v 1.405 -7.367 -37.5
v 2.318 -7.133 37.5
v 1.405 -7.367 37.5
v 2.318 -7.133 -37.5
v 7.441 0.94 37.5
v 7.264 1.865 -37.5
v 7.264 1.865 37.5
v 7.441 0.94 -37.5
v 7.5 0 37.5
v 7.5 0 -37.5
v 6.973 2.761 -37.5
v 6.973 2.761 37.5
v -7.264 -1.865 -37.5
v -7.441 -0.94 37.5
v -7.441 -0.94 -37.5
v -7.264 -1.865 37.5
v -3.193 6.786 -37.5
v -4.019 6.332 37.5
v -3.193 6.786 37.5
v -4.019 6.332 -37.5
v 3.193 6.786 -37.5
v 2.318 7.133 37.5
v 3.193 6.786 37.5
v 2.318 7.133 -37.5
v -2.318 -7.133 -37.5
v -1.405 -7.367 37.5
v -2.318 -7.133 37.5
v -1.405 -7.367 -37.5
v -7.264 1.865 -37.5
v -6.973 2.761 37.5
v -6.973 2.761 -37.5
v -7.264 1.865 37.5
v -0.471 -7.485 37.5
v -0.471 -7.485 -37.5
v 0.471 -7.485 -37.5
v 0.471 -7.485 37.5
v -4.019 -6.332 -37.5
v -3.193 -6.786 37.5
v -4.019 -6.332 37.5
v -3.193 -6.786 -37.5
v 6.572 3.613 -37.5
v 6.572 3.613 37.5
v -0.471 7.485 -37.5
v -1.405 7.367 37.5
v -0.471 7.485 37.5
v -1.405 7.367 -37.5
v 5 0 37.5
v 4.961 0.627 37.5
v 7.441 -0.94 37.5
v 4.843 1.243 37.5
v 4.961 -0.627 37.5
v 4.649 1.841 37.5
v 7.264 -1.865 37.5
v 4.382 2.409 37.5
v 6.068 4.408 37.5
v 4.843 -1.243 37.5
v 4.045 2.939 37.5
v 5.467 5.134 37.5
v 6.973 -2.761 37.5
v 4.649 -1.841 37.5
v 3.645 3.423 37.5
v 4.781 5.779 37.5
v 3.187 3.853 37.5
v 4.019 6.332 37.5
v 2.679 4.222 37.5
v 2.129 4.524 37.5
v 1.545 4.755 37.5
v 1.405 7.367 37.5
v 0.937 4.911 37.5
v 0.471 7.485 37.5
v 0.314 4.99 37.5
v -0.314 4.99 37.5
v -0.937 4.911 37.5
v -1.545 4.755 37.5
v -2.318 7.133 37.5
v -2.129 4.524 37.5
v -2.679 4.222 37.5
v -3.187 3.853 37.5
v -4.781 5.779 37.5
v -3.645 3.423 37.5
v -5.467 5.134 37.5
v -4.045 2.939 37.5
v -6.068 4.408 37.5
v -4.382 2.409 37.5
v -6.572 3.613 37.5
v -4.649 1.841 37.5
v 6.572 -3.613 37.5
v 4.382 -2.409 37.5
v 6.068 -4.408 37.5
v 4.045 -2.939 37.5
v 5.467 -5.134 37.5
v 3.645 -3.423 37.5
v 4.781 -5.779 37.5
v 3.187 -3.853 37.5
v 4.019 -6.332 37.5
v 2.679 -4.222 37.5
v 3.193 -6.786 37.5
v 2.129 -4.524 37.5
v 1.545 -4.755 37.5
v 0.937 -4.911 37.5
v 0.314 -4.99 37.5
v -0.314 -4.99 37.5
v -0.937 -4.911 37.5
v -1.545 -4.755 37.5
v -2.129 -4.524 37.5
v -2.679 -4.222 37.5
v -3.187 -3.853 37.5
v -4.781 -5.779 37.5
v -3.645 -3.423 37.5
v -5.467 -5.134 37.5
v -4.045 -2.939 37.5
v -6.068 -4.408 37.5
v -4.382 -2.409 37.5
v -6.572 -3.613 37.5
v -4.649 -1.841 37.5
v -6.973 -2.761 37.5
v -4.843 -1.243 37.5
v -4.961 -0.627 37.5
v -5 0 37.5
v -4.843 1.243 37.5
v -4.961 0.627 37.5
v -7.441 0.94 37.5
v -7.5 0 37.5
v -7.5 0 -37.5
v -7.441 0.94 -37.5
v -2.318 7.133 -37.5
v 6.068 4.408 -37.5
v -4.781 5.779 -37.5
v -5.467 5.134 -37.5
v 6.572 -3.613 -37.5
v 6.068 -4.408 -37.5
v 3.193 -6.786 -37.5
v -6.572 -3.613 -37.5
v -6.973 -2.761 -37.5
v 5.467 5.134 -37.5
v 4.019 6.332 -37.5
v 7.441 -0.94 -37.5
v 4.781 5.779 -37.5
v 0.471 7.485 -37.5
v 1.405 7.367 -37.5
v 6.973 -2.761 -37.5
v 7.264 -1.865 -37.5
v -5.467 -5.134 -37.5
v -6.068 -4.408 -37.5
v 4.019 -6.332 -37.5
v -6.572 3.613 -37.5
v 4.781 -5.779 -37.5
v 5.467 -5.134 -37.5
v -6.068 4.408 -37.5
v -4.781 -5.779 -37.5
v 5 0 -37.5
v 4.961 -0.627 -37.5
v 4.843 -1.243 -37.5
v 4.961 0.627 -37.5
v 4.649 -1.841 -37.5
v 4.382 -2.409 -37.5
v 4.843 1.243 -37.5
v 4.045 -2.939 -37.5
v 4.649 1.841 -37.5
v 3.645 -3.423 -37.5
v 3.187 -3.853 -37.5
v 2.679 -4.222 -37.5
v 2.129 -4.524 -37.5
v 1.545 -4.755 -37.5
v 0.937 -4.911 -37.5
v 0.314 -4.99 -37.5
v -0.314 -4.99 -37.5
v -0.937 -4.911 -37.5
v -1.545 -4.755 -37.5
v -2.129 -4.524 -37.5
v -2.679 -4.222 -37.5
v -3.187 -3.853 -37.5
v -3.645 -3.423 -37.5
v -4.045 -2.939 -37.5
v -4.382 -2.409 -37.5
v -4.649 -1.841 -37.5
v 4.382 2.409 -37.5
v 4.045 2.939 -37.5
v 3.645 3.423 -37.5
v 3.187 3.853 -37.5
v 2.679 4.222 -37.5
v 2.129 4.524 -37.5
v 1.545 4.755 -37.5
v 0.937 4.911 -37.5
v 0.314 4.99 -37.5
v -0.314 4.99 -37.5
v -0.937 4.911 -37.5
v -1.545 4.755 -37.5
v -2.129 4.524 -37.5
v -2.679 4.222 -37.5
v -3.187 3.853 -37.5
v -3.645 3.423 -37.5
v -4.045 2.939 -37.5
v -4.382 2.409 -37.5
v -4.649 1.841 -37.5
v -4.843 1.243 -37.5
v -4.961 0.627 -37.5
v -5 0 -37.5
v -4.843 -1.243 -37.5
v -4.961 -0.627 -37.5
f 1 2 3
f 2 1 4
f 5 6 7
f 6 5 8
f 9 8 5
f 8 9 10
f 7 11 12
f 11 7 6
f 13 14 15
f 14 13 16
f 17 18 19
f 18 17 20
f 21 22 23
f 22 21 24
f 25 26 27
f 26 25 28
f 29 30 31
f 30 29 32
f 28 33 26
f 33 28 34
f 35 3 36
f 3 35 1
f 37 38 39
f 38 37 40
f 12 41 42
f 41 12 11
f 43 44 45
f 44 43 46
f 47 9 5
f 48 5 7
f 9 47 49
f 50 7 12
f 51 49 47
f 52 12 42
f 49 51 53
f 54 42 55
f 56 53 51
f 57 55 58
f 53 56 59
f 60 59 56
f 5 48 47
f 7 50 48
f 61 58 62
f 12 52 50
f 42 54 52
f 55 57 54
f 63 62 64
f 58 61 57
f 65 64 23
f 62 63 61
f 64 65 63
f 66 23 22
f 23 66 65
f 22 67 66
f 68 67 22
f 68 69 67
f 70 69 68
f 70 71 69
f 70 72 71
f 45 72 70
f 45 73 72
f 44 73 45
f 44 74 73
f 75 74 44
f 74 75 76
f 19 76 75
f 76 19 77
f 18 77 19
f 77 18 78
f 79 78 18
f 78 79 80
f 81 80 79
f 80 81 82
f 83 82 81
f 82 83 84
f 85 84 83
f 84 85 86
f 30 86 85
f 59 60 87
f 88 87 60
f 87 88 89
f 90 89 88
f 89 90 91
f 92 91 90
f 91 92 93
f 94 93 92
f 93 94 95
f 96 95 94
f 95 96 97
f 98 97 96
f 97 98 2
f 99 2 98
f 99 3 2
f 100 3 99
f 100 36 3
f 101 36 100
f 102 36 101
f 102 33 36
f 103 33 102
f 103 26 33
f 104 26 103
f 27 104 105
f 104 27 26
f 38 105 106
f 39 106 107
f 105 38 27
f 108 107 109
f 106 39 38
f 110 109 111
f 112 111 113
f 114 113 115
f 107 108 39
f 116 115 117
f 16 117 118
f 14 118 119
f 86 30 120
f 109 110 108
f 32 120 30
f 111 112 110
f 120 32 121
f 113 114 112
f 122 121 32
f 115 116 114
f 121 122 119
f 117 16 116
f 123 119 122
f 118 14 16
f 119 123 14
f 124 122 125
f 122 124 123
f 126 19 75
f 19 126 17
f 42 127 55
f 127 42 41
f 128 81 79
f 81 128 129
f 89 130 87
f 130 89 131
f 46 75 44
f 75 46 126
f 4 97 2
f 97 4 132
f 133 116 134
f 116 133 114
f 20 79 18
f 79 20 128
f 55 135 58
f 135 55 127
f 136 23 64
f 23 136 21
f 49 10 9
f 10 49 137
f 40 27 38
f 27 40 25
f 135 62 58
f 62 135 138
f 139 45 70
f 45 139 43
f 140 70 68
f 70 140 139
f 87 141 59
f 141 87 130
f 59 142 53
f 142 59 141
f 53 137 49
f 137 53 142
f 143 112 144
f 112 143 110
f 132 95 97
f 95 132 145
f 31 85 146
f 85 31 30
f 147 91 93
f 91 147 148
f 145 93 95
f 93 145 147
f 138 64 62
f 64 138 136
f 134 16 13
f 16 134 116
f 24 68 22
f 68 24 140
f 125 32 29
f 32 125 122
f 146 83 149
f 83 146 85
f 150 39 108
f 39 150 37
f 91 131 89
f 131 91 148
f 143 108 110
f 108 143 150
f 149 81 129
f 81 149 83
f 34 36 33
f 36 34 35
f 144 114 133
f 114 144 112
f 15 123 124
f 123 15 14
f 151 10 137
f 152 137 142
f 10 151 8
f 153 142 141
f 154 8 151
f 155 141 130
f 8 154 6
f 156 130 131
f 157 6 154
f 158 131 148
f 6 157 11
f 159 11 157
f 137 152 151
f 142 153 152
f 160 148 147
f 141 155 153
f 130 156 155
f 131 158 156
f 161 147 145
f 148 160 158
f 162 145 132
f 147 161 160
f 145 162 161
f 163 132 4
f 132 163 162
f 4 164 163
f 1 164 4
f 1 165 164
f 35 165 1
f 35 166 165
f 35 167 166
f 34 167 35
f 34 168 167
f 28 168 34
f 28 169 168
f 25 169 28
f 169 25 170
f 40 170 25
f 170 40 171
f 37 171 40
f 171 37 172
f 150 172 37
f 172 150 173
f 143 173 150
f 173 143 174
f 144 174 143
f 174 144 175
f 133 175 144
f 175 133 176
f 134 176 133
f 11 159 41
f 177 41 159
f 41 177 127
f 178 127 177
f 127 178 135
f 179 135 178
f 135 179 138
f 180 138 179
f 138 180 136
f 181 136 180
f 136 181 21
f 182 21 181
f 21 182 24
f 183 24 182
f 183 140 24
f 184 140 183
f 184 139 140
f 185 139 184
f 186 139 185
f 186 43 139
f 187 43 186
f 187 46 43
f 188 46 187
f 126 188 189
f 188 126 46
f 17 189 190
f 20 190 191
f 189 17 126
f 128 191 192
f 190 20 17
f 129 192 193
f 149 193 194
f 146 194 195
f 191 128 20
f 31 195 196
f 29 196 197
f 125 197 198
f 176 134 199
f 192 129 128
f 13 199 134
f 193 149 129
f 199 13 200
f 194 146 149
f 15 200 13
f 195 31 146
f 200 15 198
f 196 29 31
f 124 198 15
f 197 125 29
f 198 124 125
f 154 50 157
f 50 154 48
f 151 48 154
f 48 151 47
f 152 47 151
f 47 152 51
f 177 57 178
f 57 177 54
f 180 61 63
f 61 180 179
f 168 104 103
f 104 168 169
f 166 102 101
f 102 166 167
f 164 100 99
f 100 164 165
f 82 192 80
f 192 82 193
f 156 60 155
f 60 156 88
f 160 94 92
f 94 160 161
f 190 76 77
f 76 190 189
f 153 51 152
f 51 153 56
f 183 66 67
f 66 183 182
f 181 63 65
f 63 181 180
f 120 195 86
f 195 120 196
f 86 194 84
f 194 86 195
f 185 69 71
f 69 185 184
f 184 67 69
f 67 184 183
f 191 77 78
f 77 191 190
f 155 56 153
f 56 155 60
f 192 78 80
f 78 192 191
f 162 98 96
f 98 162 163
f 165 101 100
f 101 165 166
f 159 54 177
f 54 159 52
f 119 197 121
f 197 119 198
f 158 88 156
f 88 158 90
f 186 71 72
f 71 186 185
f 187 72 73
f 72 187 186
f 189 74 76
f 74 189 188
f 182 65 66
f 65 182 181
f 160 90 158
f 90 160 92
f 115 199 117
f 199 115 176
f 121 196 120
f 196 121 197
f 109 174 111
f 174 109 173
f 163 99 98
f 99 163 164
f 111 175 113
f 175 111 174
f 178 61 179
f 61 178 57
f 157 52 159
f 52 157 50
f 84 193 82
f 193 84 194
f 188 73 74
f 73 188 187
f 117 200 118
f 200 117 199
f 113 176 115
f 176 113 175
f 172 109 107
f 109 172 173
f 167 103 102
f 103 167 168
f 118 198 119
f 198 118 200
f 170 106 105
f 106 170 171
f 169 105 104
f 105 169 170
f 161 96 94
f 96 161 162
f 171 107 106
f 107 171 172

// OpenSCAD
$fn = 50;


difference() {
	union() {
		translate(v = [0, 0, -37.5000000000]) {
			cylinder(h = 75, r = 7.5000000000);
		}
	}
	union() {
		translate(v = [0, 0, -100.0000000000]) {
			cylinder(h = 200, r = 5.0000000000);
		}
	}
}
